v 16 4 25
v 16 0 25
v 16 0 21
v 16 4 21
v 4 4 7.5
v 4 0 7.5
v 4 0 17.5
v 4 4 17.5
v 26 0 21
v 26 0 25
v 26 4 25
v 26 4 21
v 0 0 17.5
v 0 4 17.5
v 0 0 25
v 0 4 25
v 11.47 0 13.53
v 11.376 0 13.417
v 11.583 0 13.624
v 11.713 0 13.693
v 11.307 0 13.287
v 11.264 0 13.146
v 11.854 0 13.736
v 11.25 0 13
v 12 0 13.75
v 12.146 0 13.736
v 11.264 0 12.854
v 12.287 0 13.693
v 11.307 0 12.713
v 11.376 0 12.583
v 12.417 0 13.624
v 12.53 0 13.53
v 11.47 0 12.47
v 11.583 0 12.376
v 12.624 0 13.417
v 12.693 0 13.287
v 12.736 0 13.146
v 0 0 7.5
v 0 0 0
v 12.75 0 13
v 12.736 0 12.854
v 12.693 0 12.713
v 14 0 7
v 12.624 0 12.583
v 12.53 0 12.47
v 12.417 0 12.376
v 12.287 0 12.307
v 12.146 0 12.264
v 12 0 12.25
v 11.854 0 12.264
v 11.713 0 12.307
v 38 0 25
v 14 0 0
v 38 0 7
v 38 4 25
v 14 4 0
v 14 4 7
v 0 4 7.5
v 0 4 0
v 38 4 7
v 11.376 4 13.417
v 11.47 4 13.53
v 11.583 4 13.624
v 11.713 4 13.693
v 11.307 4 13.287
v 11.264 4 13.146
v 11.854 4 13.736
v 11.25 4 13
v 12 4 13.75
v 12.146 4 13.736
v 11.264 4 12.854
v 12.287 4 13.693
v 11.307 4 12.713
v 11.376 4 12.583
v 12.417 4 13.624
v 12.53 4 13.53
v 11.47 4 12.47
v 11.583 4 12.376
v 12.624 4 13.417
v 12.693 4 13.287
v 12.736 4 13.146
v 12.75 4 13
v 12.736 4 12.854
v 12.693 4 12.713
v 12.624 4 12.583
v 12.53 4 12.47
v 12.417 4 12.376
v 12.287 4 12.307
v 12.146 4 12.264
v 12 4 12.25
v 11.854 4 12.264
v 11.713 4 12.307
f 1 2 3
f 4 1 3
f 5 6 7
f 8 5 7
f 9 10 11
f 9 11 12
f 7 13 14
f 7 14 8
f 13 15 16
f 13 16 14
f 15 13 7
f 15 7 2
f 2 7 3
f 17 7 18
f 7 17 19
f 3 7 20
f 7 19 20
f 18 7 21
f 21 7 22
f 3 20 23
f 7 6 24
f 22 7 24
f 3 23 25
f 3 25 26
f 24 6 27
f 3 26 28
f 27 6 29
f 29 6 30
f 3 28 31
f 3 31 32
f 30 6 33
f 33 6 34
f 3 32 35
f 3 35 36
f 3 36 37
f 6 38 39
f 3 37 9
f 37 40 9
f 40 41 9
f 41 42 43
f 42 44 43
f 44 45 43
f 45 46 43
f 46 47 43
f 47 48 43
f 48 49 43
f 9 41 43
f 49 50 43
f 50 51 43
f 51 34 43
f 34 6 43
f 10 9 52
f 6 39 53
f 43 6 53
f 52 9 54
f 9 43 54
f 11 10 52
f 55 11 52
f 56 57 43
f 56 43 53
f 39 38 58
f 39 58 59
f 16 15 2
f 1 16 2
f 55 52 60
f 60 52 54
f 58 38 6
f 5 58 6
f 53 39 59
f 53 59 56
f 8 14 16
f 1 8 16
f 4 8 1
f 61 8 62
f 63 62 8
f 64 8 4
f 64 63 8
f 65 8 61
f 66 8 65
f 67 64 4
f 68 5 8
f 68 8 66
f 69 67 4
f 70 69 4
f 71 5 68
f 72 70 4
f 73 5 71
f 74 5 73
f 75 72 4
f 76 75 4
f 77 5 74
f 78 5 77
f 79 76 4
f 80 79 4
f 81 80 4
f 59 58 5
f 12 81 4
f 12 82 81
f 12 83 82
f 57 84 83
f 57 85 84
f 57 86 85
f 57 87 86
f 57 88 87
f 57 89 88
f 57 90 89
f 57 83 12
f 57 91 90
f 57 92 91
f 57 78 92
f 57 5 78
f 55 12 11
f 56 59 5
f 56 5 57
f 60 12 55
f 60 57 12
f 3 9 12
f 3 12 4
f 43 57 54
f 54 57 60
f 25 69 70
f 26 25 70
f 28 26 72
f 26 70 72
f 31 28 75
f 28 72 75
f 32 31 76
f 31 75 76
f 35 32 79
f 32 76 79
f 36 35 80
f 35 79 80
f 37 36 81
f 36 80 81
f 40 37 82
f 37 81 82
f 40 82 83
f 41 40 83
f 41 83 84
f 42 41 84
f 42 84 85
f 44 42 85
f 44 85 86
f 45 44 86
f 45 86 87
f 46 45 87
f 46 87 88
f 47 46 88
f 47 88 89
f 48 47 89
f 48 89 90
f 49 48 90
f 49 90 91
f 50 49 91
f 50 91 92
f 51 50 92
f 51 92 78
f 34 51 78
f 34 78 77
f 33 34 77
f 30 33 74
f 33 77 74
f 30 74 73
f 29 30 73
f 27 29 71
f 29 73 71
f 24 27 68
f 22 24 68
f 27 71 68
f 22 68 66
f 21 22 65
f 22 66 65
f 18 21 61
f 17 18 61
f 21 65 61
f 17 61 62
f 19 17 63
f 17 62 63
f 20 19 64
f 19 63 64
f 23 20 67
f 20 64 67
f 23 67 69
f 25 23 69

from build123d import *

# Parameters (mm, degrees)
SKETCH1_W           = 38
SKETCH1_H           = 25
BOSS_EXTRUDE1_DEPTH = 4
SKETCH2_W           = 24
SKETCH2_H           = 7
CUT_EXTRUDE1_DEPTH  = 46.661800227
SKETCH3_W           = 4
SKETCH3_H           = 10
CUT_EXTRUDE2_DEPTH  = 46.661800227
SKETCH4_W           = 10
SKETCH4_H           = 4
CUT_EXTRUDE3_DEPTH  = 46.661800227
SKETCH5_R           = 0.75
CUT_EXTRUDE4_DEPTH  = 46.661800227


with BuildPart() as part:
    # Sketch1 → Boss-Extrude1 (new body)
    with BuildSketch(Plane(origin=(0, 0, 0), x_dir=(1, 0, 0), z_dir=(0, 1, 0))):
        with Locations((19, -12.5)):
            Rectangle(SKETCH1_W, SKETCH1_H)
    extrude(amount=BOSS_EXTRUDE1_DEPTH)

    # Sketch2 → Cut-Extrude1 (cut, through all)
    with BuildSketch(Plane(origin=(0, 4, 0), x_dir=(1, 0, 0), z_dir=(0, 1, 0))):
        with Locations((26, -3.5)):
            Rectangle(SKETCH2_W, SKETCH2_H)
    extrude(amount=-CUT_EXTRUDE1_DEPTH, mode=Mode.SUBTRACT)

    # Sketch3 → Cut-Extrude2 (cut, through all)
    with BuildSketch(Plane.XZ):
        with Locations((2, 12.5)):
            Rectangle(SKETCH3_W, SKETCH3_H)
    extrude(amount=-CUT_EXTRUDE2_DEPTH, mode=Mode.SUBTRACT)

    # Sketch4 → Cut-Extrude3 (cut, through all)
    with BuildSketch(Plane(origin=(0, 0, 0), x_dir=(-1, 0, 0), z_dir=(0, -1, 0))):
        with Locations((-21, -23)):
            Rectangle(SKETCH4_W, SKETCH4_H)
    extrude(amount=-CUT_EXTRUDE3_DEPTH, mode=Mode.SUBTRACT)

    # Sketch5 → Cut-Extrude4 (cut, through all)
    with BuildSketch(Plane(origin=(0, 4, 0), x_dir=(1, 0, 0), z_dir=(0, 1, 0))):
        with Locations(Location((12, -13, 0), (0, 0, 270))):
            Circle(SKETCH5_R)
    extrude(amount=-CUT_EXTRUDE4_DEPTH, mode=Mode.SUBTRACT)


solid = part.part
